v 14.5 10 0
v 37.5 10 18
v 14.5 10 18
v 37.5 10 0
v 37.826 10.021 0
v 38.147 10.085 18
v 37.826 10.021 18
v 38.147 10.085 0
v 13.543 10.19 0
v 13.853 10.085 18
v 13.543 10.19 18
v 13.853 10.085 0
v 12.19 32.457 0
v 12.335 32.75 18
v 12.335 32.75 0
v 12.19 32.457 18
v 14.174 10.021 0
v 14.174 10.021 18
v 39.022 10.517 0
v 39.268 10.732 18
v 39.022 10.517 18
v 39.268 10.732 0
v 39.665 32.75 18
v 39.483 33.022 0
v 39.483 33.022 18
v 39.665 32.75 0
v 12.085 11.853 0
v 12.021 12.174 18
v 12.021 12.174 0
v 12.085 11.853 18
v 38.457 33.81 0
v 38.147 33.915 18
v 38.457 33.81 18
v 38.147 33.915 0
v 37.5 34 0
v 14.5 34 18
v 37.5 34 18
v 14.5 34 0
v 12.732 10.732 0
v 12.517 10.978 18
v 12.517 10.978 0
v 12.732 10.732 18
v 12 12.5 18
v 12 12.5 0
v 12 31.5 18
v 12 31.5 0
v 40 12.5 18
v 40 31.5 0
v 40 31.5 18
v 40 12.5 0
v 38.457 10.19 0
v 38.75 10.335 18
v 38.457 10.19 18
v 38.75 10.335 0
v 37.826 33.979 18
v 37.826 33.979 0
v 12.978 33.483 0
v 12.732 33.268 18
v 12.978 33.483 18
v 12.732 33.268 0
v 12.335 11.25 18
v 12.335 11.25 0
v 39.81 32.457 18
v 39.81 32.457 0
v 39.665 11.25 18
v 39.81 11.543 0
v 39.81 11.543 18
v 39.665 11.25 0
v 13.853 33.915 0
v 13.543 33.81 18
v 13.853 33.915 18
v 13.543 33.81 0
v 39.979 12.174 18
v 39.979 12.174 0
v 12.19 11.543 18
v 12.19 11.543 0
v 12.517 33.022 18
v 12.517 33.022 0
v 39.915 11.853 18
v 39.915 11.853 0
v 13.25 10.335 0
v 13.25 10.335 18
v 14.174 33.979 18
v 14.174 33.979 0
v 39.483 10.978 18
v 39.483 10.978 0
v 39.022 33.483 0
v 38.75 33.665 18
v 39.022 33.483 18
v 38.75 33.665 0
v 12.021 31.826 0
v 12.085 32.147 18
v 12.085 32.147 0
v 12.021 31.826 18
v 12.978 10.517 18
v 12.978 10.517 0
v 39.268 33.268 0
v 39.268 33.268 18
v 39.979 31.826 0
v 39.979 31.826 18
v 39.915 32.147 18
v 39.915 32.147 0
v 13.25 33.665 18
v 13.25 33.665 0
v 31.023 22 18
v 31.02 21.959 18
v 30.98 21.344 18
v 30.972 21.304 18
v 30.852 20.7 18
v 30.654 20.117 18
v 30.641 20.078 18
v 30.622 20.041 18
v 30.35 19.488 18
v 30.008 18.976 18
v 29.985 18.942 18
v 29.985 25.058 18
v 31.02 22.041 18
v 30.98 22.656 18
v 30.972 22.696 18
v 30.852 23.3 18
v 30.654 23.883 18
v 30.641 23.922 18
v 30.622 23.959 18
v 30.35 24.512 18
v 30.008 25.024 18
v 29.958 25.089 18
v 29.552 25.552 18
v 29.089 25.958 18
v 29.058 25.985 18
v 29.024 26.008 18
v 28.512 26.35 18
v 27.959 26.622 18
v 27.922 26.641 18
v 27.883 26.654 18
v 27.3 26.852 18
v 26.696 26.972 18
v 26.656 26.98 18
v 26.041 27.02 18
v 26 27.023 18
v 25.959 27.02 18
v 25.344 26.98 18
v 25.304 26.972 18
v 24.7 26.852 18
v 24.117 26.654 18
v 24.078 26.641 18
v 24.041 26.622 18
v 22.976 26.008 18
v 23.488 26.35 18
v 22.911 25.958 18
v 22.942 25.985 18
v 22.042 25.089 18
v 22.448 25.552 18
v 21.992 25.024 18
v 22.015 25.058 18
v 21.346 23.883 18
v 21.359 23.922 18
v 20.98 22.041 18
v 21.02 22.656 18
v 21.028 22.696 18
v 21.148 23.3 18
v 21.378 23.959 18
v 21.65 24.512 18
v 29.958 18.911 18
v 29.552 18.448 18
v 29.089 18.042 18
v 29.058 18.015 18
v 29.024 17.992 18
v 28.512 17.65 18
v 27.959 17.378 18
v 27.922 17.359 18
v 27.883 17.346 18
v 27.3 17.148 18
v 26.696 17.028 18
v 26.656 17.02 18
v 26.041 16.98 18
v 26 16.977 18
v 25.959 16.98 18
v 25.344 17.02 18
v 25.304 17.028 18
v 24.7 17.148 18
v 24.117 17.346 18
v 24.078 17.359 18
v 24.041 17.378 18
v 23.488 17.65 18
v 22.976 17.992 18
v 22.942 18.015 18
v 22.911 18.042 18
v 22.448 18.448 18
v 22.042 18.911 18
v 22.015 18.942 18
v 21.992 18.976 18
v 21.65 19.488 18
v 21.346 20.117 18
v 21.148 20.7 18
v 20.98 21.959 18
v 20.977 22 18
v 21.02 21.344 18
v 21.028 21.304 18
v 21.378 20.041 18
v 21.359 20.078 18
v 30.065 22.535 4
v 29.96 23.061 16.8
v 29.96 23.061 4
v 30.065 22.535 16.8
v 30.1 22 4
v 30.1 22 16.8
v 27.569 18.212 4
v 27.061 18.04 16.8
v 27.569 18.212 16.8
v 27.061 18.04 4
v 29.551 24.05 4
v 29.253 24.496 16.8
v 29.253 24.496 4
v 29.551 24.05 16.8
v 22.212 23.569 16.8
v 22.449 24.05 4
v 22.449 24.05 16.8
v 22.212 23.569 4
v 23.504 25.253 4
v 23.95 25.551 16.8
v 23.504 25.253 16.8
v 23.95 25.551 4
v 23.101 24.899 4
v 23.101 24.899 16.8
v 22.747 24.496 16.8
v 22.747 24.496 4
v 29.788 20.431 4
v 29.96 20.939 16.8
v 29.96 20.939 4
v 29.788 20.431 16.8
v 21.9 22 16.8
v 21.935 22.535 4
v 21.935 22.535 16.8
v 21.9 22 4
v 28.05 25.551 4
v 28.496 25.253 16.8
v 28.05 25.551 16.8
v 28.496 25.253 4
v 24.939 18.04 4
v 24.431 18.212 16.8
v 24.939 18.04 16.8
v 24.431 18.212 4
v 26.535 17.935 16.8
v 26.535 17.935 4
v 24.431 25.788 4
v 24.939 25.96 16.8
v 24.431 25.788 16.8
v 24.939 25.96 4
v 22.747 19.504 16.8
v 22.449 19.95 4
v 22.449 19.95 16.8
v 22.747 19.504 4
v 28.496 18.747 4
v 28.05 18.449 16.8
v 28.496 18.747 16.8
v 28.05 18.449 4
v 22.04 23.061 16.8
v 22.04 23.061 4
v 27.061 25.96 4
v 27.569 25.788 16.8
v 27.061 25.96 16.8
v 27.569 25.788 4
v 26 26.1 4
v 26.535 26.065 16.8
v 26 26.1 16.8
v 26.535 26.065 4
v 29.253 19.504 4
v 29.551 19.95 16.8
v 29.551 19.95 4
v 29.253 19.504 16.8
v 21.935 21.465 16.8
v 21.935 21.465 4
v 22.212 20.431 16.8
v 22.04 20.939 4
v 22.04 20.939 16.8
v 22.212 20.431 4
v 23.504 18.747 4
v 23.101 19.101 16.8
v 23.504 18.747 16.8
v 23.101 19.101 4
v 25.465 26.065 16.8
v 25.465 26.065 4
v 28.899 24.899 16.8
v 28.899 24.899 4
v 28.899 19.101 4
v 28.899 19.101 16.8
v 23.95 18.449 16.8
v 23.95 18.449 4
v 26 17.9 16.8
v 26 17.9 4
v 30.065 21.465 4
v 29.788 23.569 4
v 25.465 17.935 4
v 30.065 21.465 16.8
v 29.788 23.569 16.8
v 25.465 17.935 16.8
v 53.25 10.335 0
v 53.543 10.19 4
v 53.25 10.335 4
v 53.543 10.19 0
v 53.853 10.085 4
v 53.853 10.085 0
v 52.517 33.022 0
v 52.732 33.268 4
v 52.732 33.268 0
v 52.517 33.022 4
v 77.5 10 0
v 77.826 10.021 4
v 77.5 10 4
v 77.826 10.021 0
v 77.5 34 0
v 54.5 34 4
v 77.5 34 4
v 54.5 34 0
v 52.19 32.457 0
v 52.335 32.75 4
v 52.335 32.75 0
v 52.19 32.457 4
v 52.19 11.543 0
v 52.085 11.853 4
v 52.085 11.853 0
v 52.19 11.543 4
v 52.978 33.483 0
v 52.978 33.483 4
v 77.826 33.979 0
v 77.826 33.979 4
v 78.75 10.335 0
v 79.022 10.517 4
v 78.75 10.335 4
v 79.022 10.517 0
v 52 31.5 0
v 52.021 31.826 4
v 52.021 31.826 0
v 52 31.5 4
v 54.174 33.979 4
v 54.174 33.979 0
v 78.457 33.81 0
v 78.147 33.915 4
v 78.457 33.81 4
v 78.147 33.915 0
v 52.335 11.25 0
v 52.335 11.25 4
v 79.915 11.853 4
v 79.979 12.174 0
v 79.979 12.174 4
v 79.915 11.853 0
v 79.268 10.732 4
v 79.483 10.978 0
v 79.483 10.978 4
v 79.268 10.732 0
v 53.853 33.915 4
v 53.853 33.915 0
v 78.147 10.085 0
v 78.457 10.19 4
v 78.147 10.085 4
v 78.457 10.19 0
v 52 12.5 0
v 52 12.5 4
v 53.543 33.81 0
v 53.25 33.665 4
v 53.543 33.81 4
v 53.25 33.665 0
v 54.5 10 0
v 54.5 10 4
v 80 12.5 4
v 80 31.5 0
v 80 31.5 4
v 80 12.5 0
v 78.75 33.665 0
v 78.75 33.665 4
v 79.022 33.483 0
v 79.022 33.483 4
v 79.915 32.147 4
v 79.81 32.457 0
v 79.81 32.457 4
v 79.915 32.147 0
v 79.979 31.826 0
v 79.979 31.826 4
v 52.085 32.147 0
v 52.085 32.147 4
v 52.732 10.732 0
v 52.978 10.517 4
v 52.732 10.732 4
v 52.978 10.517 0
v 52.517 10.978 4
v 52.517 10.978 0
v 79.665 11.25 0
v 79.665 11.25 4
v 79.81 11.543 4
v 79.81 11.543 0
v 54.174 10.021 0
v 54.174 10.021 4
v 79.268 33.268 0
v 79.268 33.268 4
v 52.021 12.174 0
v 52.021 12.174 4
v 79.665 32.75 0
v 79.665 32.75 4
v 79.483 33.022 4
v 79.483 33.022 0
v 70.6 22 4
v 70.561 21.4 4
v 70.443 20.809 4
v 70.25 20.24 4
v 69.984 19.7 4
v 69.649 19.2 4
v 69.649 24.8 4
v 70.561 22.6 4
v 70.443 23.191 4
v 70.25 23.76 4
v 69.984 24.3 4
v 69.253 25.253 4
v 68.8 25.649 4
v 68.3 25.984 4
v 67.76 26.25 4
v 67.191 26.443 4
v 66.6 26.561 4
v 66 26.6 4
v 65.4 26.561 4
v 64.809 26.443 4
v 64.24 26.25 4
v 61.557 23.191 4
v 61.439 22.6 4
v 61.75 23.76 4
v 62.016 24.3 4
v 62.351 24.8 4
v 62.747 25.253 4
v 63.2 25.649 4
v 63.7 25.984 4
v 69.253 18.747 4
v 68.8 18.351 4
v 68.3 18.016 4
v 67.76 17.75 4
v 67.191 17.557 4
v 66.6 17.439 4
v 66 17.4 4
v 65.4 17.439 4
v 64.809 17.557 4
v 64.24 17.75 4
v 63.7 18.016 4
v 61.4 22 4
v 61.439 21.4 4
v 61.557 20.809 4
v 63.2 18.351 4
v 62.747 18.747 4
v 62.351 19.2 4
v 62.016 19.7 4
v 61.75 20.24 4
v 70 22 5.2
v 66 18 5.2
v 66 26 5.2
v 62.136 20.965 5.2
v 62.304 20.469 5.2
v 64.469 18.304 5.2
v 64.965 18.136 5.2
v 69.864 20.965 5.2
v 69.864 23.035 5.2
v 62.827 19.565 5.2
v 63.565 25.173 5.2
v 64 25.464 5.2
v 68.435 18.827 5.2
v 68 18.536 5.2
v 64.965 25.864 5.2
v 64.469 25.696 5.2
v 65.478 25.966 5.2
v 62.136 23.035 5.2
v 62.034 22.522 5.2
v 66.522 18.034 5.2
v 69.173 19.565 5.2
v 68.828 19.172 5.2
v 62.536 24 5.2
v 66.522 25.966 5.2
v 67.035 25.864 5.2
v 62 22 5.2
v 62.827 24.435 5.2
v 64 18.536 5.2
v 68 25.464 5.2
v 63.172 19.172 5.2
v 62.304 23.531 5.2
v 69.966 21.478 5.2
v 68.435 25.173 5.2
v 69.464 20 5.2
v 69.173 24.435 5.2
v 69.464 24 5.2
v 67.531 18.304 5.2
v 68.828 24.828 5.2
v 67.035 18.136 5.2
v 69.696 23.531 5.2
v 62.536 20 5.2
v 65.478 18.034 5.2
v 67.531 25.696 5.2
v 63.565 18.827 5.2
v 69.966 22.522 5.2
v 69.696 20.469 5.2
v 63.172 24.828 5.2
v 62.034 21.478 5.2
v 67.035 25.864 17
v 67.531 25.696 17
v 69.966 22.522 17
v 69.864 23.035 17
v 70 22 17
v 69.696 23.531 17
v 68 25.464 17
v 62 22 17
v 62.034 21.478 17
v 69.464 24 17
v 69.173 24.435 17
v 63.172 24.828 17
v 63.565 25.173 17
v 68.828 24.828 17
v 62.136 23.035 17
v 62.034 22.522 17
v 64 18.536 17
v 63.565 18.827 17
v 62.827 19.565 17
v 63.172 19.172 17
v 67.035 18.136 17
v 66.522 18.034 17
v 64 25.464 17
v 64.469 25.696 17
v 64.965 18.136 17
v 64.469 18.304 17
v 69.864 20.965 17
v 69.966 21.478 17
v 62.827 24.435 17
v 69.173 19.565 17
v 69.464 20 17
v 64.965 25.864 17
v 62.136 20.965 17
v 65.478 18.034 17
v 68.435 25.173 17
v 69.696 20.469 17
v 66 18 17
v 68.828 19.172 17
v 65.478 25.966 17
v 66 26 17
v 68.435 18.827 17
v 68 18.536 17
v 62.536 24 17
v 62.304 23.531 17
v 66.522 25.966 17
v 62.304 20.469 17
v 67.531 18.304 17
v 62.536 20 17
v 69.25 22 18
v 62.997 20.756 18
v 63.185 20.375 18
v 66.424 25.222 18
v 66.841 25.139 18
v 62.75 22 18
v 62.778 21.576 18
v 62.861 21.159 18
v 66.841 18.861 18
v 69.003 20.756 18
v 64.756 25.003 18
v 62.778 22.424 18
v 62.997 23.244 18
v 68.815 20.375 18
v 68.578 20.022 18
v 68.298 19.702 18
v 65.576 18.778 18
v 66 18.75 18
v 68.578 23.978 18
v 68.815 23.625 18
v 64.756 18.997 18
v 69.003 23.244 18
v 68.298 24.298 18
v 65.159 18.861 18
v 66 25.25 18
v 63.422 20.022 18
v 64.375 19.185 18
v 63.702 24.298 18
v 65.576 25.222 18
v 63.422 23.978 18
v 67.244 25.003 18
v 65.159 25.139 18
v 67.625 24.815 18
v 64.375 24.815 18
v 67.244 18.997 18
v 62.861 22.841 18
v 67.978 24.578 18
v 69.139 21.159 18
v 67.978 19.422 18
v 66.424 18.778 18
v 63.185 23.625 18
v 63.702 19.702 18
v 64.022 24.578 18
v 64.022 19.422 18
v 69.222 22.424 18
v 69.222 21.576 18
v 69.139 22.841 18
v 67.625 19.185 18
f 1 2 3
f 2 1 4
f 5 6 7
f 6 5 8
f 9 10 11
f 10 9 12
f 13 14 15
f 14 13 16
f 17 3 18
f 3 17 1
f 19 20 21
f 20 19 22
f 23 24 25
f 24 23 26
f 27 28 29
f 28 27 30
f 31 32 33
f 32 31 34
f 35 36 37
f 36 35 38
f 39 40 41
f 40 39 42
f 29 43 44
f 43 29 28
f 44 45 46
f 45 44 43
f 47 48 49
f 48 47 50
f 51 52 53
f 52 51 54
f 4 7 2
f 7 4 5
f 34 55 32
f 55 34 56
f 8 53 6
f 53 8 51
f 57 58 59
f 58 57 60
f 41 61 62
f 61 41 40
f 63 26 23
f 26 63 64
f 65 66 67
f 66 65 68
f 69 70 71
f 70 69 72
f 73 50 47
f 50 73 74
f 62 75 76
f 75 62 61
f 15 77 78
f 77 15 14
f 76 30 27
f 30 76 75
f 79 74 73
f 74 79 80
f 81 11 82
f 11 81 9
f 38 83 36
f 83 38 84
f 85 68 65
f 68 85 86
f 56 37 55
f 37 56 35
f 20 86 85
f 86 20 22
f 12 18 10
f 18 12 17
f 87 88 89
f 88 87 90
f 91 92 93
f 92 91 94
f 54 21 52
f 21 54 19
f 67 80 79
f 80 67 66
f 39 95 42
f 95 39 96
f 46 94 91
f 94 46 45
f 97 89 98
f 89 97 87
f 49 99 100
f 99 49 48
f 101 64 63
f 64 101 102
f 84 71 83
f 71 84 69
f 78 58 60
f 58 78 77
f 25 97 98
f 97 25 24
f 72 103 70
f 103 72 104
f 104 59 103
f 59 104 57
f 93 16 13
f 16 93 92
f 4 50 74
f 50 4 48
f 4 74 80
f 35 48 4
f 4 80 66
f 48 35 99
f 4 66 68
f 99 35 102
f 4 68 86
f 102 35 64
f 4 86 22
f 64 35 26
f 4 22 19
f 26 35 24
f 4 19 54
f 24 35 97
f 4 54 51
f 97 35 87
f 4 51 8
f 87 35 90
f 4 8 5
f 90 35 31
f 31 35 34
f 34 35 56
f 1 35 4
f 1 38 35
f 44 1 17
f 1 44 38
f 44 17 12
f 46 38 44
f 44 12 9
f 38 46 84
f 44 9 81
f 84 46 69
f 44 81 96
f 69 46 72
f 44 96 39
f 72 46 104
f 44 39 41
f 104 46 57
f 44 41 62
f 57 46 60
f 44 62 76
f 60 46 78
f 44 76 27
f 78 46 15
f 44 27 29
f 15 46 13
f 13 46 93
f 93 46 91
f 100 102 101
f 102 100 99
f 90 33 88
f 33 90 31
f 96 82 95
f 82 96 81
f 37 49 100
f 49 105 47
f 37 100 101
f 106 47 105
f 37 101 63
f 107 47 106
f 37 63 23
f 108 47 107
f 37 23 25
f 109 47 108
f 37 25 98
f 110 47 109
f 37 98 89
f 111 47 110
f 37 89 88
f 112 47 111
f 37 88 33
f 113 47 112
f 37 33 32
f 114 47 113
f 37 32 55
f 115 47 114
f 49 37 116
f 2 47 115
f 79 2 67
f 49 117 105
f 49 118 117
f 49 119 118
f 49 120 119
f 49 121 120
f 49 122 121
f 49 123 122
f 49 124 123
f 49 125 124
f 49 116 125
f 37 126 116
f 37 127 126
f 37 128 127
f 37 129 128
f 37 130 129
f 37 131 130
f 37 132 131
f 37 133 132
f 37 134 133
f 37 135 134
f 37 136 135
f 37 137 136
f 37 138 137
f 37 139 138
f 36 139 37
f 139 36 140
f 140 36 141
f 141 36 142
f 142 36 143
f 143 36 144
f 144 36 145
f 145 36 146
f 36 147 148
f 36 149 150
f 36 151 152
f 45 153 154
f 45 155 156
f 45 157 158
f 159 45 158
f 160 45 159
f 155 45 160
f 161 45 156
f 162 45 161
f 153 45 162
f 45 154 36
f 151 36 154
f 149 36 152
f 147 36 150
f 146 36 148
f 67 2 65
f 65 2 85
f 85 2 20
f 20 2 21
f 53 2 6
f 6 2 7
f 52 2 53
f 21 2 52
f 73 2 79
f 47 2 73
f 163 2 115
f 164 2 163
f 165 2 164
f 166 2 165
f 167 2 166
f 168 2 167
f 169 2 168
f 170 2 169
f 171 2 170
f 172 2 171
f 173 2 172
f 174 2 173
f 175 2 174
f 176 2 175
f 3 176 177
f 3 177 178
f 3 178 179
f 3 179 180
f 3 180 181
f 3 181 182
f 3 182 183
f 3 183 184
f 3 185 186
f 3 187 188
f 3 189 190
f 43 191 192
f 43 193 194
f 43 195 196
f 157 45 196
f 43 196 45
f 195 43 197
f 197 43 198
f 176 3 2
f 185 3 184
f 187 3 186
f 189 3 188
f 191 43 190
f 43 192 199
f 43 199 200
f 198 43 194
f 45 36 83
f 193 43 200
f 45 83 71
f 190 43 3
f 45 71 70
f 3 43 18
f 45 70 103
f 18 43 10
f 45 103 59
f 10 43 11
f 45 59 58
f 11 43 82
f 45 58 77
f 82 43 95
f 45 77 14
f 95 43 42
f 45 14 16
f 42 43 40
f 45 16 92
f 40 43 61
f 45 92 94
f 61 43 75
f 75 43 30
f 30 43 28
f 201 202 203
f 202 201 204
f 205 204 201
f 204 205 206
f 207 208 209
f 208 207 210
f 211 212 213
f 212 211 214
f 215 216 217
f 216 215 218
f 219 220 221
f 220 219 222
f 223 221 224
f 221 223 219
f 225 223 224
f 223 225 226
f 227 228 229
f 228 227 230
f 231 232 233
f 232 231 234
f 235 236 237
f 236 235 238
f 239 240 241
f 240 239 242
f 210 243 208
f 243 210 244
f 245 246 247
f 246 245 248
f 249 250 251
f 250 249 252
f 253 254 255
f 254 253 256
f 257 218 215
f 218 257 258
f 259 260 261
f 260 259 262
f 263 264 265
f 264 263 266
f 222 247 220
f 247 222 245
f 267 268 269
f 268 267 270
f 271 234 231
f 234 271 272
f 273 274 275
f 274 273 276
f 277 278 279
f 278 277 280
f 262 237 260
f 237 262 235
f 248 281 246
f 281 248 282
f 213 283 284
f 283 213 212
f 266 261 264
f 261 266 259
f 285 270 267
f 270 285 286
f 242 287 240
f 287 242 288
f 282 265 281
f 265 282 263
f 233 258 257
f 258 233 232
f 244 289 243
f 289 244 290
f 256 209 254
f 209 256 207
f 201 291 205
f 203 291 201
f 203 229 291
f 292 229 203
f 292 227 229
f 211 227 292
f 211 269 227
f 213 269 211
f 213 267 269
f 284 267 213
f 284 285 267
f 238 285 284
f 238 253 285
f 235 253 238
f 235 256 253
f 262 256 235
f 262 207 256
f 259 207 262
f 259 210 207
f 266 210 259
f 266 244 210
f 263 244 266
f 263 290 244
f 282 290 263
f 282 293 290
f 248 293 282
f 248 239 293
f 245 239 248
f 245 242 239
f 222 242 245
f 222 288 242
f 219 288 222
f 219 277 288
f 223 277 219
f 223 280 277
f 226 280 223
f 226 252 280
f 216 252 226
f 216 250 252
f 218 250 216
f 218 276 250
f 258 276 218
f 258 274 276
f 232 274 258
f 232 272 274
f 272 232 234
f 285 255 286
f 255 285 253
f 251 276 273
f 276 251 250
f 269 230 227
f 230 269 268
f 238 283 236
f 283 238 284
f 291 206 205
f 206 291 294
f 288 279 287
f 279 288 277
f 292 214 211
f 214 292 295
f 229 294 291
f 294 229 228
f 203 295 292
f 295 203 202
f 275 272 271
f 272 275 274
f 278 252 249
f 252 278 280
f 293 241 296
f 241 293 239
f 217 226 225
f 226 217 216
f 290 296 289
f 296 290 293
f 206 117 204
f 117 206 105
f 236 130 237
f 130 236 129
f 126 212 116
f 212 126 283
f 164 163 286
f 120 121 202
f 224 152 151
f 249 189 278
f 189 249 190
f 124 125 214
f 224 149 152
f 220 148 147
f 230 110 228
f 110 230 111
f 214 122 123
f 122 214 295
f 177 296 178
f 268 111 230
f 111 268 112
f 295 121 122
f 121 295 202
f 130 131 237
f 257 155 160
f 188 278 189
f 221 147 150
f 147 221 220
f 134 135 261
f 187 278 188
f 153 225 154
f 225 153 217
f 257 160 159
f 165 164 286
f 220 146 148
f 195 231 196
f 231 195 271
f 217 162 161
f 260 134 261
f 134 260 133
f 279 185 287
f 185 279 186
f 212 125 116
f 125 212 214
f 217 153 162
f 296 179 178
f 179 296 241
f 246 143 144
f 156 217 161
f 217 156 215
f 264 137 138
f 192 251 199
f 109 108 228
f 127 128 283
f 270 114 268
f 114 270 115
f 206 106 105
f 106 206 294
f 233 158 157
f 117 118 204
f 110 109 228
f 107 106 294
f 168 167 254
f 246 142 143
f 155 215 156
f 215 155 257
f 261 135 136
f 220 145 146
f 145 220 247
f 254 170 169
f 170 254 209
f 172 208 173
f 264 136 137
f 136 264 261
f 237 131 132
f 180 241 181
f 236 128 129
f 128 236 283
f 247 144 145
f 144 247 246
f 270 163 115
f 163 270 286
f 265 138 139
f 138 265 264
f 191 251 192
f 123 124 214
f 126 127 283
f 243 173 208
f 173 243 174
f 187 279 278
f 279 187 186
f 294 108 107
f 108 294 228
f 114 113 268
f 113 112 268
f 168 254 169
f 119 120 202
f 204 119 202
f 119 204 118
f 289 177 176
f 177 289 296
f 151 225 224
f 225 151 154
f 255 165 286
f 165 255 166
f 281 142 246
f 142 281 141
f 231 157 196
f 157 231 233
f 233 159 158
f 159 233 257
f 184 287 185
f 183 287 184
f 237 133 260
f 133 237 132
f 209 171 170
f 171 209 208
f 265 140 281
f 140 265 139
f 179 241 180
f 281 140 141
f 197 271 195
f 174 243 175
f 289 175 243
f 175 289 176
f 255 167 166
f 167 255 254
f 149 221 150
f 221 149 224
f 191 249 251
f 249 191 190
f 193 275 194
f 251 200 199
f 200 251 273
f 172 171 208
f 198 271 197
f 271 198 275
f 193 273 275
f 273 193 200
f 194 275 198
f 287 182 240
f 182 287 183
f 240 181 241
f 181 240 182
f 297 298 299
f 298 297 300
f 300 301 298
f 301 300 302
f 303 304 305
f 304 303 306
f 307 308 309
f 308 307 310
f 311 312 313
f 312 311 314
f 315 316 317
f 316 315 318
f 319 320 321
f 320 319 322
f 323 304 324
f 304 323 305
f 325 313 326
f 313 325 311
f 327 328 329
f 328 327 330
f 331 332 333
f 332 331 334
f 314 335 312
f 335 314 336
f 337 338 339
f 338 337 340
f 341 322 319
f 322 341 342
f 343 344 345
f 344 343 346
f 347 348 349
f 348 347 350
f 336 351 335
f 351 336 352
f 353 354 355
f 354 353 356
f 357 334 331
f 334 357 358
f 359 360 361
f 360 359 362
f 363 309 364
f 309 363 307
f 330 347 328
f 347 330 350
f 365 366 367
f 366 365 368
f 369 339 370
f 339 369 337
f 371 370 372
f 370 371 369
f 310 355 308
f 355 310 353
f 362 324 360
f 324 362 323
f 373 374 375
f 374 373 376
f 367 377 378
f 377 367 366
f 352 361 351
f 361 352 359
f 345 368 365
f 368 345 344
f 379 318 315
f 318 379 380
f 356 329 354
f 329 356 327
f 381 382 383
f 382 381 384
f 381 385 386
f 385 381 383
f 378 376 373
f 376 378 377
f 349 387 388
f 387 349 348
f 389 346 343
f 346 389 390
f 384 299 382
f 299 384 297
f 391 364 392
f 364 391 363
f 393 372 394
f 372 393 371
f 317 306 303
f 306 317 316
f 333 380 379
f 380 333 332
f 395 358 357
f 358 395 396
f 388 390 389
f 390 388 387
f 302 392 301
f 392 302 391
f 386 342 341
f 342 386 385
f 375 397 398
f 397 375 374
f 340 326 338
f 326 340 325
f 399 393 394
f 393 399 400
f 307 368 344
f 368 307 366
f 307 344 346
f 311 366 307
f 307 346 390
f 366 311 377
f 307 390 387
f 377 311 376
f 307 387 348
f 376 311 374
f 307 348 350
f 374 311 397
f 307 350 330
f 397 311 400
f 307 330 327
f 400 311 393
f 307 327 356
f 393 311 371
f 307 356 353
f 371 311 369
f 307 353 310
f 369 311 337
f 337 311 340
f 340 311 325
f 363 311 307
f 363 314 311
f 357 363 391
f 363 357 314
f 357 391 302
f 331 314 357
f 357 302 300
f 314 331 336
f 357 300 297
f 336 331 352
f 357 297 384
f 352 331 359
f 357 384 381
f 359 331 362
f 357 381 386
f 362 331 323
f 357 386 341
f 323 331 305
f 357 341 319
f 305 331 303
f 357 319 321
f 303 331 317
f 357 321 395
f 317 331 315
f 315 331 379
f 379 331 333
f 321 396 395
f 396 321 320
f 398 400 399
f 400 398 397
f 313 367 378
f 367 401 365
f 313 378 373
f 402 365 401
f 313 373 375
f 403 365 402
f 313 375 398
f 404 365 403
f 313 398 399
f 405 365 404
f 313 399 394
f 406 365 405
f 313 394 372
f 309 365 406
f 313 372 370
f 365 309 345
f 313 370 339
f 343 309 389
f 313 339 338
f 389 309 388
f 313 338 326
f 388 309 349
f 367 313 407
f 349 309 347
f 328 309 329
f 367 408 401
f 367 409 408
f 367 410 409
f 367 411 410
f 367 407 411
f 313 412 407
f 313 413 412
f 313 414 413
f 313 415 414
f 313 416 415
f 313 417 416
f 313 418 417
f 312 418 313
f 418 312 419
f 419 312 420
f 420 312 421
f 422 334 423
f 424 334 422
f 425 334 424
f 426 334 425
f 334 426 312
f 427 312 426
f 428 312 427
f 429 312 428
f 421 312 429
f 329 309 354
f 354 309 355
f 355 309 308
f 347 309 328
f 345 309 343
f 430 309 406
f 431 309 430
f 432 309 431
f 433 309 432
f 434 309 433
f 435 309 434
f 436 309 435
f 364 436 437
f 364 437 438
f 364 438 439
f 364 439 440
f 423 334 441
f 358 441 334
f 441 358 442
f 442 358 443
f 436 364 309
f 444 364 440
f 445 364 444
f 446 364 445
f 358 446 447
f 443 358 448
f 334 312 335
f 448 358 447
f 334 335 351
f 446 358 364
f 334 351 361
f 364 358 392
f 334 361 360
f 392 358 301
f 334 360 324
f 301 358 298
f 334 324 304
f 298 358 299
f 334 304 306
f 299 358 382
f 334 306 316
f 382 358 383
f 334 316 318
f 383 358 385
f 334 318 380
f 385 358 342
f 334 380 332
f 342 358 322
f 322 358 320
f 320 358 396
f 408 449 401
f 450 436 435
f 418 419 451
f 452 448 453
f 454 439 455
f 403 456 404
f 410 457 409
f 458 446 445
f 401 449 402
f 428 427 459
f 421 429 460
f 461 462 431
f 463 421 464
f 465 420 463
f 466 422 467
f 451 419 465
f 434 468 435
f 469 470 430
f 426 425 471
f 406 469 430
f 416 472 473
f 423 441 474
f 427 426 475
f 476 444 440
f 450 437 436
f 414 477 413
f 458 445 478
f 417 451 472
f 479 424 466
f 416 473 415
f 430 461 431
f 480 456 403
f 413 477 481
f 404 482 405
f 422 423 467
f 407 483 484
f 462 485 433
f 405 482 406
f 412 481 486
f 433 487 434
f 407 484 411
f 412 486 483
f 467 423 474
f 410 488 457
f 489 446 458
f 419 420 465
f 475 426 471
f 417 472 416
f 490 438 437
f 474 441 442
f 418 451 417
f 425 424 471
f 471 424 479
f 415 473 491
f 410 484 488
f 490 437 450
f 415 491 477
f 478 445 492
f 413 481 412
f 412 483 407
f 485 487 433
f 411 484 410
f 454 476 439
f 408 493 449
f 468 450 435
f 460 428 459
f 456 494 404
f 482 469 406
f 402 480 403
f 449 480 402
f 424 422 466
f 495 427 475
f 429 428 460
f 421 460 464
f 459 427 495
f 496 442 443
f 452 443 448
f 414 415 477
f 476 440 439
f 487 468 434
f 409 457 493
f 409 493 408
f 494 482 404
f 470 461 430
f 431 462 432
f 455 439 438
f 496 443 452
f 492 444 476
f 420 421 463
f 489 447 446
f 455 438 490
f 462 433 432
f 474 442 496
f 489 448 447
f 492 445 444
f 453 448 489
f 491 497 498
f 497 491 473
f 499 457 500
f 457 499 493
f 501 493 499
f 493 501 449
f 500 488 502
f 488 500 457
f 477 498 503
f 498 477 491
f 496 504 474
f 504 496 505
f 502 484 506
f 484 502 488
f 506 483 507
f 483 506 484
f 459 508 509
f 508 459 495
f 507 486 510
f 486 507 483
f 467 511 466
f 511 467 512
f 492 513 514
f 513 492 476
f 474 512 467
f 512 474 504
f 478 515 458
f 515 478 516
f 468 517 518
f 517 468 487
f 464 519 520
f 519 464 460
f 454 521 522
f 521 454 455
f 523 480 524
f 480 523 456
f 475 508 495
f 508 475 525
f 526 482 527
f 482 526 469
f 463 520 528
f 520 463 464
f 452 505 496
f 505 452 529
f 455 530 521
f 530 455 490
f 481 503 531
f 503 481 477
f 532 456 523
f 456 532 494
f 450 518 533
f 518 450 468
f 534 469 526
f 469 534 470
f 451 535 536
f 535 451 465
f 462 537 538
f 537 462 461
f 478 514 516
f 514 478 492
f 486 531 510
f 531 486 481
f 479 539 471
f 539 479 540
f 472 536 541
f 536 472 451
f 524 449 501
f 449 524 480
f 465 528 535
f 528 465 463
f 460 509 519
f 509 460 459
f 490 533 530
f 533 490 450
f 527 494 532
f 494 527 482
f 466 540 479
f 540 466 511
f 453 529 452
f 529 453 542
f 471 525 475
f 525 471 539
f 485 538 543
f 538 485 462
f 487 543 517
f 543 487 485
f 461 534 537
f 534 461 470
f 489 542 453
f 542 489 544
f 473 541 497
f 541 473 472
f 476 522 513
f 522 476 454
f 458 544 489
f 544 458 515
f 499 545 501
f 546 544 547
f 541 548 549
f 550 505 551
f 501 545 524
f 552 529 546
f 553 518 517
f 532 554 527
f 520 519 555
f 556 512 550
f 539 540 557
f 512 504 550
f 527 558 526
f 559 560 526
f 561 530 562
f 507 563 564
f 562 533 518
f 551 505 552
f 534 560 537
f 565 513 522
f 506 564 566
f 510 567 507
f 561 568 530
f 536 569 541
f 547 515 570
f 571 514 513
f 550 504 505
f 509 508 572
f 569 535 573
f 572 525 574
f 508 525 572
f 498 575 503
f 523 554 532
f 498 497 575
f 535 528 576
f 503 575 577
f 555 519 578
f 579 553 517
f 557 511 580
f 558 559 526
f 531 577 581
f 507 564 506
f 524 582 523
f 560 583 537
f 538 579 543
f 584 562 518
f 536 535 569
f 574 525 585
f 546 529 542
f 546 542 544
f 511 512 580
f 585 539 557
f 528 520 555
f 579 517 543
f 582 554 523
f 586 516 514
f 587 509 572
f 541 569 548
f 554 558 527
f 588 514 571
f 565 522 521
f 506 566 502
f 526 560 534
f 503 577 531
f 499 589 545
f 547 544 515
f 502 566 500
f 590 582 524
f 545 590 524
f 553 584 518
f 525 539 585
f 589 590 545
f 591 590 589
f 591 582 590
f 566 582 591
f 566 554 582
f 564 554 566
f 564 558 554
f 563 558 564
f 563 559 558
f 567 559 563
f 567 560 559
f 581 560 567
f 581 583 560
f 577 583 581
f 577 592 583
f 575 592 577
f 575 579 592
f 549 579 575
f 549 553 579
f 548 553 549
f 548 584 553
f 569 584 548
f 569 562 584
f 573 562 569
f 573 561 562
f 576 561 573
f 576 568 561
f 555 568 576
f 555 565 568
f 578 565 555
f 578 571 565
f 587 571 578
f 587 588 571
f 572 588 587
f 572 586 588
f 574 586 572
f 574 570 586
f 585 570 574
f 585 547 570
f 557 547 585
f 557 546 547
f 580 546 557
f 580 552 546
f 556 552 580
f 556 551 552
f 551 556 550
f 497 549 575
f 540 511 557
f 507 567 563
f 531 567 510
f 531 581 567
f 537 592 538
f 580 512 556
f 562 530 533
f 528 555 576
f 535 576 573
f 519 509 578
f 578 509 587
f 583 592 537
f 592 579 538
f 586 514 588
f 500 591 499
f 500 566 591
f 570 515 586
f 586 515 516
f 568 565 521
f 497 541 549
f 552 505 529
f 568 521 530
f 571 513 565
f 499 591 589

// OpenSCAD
/*
Sample 040: Dauerhafter Pressstift — 0,10 mm Spiel
Generated from the FDM Mechanical Sample Library.
Units: millimetres.

Override examples:
  openscad -o custom.stl -D 'view="plate"' -D 'render_fn=64' model.scad
  openscad -o preview.png -D 'view="assembly"' model.scad
*/
use <../../../library/fdm_mechanisms.scad>

render_fn = is_undef(render_fn) ? 48 : render_fn;
view = is_undef(view) ? "plate" : view;
$fn = render_fn;

sample_pressfit_dowel(
    view=view,
    pin_d=8,
    gap=0.1
);
